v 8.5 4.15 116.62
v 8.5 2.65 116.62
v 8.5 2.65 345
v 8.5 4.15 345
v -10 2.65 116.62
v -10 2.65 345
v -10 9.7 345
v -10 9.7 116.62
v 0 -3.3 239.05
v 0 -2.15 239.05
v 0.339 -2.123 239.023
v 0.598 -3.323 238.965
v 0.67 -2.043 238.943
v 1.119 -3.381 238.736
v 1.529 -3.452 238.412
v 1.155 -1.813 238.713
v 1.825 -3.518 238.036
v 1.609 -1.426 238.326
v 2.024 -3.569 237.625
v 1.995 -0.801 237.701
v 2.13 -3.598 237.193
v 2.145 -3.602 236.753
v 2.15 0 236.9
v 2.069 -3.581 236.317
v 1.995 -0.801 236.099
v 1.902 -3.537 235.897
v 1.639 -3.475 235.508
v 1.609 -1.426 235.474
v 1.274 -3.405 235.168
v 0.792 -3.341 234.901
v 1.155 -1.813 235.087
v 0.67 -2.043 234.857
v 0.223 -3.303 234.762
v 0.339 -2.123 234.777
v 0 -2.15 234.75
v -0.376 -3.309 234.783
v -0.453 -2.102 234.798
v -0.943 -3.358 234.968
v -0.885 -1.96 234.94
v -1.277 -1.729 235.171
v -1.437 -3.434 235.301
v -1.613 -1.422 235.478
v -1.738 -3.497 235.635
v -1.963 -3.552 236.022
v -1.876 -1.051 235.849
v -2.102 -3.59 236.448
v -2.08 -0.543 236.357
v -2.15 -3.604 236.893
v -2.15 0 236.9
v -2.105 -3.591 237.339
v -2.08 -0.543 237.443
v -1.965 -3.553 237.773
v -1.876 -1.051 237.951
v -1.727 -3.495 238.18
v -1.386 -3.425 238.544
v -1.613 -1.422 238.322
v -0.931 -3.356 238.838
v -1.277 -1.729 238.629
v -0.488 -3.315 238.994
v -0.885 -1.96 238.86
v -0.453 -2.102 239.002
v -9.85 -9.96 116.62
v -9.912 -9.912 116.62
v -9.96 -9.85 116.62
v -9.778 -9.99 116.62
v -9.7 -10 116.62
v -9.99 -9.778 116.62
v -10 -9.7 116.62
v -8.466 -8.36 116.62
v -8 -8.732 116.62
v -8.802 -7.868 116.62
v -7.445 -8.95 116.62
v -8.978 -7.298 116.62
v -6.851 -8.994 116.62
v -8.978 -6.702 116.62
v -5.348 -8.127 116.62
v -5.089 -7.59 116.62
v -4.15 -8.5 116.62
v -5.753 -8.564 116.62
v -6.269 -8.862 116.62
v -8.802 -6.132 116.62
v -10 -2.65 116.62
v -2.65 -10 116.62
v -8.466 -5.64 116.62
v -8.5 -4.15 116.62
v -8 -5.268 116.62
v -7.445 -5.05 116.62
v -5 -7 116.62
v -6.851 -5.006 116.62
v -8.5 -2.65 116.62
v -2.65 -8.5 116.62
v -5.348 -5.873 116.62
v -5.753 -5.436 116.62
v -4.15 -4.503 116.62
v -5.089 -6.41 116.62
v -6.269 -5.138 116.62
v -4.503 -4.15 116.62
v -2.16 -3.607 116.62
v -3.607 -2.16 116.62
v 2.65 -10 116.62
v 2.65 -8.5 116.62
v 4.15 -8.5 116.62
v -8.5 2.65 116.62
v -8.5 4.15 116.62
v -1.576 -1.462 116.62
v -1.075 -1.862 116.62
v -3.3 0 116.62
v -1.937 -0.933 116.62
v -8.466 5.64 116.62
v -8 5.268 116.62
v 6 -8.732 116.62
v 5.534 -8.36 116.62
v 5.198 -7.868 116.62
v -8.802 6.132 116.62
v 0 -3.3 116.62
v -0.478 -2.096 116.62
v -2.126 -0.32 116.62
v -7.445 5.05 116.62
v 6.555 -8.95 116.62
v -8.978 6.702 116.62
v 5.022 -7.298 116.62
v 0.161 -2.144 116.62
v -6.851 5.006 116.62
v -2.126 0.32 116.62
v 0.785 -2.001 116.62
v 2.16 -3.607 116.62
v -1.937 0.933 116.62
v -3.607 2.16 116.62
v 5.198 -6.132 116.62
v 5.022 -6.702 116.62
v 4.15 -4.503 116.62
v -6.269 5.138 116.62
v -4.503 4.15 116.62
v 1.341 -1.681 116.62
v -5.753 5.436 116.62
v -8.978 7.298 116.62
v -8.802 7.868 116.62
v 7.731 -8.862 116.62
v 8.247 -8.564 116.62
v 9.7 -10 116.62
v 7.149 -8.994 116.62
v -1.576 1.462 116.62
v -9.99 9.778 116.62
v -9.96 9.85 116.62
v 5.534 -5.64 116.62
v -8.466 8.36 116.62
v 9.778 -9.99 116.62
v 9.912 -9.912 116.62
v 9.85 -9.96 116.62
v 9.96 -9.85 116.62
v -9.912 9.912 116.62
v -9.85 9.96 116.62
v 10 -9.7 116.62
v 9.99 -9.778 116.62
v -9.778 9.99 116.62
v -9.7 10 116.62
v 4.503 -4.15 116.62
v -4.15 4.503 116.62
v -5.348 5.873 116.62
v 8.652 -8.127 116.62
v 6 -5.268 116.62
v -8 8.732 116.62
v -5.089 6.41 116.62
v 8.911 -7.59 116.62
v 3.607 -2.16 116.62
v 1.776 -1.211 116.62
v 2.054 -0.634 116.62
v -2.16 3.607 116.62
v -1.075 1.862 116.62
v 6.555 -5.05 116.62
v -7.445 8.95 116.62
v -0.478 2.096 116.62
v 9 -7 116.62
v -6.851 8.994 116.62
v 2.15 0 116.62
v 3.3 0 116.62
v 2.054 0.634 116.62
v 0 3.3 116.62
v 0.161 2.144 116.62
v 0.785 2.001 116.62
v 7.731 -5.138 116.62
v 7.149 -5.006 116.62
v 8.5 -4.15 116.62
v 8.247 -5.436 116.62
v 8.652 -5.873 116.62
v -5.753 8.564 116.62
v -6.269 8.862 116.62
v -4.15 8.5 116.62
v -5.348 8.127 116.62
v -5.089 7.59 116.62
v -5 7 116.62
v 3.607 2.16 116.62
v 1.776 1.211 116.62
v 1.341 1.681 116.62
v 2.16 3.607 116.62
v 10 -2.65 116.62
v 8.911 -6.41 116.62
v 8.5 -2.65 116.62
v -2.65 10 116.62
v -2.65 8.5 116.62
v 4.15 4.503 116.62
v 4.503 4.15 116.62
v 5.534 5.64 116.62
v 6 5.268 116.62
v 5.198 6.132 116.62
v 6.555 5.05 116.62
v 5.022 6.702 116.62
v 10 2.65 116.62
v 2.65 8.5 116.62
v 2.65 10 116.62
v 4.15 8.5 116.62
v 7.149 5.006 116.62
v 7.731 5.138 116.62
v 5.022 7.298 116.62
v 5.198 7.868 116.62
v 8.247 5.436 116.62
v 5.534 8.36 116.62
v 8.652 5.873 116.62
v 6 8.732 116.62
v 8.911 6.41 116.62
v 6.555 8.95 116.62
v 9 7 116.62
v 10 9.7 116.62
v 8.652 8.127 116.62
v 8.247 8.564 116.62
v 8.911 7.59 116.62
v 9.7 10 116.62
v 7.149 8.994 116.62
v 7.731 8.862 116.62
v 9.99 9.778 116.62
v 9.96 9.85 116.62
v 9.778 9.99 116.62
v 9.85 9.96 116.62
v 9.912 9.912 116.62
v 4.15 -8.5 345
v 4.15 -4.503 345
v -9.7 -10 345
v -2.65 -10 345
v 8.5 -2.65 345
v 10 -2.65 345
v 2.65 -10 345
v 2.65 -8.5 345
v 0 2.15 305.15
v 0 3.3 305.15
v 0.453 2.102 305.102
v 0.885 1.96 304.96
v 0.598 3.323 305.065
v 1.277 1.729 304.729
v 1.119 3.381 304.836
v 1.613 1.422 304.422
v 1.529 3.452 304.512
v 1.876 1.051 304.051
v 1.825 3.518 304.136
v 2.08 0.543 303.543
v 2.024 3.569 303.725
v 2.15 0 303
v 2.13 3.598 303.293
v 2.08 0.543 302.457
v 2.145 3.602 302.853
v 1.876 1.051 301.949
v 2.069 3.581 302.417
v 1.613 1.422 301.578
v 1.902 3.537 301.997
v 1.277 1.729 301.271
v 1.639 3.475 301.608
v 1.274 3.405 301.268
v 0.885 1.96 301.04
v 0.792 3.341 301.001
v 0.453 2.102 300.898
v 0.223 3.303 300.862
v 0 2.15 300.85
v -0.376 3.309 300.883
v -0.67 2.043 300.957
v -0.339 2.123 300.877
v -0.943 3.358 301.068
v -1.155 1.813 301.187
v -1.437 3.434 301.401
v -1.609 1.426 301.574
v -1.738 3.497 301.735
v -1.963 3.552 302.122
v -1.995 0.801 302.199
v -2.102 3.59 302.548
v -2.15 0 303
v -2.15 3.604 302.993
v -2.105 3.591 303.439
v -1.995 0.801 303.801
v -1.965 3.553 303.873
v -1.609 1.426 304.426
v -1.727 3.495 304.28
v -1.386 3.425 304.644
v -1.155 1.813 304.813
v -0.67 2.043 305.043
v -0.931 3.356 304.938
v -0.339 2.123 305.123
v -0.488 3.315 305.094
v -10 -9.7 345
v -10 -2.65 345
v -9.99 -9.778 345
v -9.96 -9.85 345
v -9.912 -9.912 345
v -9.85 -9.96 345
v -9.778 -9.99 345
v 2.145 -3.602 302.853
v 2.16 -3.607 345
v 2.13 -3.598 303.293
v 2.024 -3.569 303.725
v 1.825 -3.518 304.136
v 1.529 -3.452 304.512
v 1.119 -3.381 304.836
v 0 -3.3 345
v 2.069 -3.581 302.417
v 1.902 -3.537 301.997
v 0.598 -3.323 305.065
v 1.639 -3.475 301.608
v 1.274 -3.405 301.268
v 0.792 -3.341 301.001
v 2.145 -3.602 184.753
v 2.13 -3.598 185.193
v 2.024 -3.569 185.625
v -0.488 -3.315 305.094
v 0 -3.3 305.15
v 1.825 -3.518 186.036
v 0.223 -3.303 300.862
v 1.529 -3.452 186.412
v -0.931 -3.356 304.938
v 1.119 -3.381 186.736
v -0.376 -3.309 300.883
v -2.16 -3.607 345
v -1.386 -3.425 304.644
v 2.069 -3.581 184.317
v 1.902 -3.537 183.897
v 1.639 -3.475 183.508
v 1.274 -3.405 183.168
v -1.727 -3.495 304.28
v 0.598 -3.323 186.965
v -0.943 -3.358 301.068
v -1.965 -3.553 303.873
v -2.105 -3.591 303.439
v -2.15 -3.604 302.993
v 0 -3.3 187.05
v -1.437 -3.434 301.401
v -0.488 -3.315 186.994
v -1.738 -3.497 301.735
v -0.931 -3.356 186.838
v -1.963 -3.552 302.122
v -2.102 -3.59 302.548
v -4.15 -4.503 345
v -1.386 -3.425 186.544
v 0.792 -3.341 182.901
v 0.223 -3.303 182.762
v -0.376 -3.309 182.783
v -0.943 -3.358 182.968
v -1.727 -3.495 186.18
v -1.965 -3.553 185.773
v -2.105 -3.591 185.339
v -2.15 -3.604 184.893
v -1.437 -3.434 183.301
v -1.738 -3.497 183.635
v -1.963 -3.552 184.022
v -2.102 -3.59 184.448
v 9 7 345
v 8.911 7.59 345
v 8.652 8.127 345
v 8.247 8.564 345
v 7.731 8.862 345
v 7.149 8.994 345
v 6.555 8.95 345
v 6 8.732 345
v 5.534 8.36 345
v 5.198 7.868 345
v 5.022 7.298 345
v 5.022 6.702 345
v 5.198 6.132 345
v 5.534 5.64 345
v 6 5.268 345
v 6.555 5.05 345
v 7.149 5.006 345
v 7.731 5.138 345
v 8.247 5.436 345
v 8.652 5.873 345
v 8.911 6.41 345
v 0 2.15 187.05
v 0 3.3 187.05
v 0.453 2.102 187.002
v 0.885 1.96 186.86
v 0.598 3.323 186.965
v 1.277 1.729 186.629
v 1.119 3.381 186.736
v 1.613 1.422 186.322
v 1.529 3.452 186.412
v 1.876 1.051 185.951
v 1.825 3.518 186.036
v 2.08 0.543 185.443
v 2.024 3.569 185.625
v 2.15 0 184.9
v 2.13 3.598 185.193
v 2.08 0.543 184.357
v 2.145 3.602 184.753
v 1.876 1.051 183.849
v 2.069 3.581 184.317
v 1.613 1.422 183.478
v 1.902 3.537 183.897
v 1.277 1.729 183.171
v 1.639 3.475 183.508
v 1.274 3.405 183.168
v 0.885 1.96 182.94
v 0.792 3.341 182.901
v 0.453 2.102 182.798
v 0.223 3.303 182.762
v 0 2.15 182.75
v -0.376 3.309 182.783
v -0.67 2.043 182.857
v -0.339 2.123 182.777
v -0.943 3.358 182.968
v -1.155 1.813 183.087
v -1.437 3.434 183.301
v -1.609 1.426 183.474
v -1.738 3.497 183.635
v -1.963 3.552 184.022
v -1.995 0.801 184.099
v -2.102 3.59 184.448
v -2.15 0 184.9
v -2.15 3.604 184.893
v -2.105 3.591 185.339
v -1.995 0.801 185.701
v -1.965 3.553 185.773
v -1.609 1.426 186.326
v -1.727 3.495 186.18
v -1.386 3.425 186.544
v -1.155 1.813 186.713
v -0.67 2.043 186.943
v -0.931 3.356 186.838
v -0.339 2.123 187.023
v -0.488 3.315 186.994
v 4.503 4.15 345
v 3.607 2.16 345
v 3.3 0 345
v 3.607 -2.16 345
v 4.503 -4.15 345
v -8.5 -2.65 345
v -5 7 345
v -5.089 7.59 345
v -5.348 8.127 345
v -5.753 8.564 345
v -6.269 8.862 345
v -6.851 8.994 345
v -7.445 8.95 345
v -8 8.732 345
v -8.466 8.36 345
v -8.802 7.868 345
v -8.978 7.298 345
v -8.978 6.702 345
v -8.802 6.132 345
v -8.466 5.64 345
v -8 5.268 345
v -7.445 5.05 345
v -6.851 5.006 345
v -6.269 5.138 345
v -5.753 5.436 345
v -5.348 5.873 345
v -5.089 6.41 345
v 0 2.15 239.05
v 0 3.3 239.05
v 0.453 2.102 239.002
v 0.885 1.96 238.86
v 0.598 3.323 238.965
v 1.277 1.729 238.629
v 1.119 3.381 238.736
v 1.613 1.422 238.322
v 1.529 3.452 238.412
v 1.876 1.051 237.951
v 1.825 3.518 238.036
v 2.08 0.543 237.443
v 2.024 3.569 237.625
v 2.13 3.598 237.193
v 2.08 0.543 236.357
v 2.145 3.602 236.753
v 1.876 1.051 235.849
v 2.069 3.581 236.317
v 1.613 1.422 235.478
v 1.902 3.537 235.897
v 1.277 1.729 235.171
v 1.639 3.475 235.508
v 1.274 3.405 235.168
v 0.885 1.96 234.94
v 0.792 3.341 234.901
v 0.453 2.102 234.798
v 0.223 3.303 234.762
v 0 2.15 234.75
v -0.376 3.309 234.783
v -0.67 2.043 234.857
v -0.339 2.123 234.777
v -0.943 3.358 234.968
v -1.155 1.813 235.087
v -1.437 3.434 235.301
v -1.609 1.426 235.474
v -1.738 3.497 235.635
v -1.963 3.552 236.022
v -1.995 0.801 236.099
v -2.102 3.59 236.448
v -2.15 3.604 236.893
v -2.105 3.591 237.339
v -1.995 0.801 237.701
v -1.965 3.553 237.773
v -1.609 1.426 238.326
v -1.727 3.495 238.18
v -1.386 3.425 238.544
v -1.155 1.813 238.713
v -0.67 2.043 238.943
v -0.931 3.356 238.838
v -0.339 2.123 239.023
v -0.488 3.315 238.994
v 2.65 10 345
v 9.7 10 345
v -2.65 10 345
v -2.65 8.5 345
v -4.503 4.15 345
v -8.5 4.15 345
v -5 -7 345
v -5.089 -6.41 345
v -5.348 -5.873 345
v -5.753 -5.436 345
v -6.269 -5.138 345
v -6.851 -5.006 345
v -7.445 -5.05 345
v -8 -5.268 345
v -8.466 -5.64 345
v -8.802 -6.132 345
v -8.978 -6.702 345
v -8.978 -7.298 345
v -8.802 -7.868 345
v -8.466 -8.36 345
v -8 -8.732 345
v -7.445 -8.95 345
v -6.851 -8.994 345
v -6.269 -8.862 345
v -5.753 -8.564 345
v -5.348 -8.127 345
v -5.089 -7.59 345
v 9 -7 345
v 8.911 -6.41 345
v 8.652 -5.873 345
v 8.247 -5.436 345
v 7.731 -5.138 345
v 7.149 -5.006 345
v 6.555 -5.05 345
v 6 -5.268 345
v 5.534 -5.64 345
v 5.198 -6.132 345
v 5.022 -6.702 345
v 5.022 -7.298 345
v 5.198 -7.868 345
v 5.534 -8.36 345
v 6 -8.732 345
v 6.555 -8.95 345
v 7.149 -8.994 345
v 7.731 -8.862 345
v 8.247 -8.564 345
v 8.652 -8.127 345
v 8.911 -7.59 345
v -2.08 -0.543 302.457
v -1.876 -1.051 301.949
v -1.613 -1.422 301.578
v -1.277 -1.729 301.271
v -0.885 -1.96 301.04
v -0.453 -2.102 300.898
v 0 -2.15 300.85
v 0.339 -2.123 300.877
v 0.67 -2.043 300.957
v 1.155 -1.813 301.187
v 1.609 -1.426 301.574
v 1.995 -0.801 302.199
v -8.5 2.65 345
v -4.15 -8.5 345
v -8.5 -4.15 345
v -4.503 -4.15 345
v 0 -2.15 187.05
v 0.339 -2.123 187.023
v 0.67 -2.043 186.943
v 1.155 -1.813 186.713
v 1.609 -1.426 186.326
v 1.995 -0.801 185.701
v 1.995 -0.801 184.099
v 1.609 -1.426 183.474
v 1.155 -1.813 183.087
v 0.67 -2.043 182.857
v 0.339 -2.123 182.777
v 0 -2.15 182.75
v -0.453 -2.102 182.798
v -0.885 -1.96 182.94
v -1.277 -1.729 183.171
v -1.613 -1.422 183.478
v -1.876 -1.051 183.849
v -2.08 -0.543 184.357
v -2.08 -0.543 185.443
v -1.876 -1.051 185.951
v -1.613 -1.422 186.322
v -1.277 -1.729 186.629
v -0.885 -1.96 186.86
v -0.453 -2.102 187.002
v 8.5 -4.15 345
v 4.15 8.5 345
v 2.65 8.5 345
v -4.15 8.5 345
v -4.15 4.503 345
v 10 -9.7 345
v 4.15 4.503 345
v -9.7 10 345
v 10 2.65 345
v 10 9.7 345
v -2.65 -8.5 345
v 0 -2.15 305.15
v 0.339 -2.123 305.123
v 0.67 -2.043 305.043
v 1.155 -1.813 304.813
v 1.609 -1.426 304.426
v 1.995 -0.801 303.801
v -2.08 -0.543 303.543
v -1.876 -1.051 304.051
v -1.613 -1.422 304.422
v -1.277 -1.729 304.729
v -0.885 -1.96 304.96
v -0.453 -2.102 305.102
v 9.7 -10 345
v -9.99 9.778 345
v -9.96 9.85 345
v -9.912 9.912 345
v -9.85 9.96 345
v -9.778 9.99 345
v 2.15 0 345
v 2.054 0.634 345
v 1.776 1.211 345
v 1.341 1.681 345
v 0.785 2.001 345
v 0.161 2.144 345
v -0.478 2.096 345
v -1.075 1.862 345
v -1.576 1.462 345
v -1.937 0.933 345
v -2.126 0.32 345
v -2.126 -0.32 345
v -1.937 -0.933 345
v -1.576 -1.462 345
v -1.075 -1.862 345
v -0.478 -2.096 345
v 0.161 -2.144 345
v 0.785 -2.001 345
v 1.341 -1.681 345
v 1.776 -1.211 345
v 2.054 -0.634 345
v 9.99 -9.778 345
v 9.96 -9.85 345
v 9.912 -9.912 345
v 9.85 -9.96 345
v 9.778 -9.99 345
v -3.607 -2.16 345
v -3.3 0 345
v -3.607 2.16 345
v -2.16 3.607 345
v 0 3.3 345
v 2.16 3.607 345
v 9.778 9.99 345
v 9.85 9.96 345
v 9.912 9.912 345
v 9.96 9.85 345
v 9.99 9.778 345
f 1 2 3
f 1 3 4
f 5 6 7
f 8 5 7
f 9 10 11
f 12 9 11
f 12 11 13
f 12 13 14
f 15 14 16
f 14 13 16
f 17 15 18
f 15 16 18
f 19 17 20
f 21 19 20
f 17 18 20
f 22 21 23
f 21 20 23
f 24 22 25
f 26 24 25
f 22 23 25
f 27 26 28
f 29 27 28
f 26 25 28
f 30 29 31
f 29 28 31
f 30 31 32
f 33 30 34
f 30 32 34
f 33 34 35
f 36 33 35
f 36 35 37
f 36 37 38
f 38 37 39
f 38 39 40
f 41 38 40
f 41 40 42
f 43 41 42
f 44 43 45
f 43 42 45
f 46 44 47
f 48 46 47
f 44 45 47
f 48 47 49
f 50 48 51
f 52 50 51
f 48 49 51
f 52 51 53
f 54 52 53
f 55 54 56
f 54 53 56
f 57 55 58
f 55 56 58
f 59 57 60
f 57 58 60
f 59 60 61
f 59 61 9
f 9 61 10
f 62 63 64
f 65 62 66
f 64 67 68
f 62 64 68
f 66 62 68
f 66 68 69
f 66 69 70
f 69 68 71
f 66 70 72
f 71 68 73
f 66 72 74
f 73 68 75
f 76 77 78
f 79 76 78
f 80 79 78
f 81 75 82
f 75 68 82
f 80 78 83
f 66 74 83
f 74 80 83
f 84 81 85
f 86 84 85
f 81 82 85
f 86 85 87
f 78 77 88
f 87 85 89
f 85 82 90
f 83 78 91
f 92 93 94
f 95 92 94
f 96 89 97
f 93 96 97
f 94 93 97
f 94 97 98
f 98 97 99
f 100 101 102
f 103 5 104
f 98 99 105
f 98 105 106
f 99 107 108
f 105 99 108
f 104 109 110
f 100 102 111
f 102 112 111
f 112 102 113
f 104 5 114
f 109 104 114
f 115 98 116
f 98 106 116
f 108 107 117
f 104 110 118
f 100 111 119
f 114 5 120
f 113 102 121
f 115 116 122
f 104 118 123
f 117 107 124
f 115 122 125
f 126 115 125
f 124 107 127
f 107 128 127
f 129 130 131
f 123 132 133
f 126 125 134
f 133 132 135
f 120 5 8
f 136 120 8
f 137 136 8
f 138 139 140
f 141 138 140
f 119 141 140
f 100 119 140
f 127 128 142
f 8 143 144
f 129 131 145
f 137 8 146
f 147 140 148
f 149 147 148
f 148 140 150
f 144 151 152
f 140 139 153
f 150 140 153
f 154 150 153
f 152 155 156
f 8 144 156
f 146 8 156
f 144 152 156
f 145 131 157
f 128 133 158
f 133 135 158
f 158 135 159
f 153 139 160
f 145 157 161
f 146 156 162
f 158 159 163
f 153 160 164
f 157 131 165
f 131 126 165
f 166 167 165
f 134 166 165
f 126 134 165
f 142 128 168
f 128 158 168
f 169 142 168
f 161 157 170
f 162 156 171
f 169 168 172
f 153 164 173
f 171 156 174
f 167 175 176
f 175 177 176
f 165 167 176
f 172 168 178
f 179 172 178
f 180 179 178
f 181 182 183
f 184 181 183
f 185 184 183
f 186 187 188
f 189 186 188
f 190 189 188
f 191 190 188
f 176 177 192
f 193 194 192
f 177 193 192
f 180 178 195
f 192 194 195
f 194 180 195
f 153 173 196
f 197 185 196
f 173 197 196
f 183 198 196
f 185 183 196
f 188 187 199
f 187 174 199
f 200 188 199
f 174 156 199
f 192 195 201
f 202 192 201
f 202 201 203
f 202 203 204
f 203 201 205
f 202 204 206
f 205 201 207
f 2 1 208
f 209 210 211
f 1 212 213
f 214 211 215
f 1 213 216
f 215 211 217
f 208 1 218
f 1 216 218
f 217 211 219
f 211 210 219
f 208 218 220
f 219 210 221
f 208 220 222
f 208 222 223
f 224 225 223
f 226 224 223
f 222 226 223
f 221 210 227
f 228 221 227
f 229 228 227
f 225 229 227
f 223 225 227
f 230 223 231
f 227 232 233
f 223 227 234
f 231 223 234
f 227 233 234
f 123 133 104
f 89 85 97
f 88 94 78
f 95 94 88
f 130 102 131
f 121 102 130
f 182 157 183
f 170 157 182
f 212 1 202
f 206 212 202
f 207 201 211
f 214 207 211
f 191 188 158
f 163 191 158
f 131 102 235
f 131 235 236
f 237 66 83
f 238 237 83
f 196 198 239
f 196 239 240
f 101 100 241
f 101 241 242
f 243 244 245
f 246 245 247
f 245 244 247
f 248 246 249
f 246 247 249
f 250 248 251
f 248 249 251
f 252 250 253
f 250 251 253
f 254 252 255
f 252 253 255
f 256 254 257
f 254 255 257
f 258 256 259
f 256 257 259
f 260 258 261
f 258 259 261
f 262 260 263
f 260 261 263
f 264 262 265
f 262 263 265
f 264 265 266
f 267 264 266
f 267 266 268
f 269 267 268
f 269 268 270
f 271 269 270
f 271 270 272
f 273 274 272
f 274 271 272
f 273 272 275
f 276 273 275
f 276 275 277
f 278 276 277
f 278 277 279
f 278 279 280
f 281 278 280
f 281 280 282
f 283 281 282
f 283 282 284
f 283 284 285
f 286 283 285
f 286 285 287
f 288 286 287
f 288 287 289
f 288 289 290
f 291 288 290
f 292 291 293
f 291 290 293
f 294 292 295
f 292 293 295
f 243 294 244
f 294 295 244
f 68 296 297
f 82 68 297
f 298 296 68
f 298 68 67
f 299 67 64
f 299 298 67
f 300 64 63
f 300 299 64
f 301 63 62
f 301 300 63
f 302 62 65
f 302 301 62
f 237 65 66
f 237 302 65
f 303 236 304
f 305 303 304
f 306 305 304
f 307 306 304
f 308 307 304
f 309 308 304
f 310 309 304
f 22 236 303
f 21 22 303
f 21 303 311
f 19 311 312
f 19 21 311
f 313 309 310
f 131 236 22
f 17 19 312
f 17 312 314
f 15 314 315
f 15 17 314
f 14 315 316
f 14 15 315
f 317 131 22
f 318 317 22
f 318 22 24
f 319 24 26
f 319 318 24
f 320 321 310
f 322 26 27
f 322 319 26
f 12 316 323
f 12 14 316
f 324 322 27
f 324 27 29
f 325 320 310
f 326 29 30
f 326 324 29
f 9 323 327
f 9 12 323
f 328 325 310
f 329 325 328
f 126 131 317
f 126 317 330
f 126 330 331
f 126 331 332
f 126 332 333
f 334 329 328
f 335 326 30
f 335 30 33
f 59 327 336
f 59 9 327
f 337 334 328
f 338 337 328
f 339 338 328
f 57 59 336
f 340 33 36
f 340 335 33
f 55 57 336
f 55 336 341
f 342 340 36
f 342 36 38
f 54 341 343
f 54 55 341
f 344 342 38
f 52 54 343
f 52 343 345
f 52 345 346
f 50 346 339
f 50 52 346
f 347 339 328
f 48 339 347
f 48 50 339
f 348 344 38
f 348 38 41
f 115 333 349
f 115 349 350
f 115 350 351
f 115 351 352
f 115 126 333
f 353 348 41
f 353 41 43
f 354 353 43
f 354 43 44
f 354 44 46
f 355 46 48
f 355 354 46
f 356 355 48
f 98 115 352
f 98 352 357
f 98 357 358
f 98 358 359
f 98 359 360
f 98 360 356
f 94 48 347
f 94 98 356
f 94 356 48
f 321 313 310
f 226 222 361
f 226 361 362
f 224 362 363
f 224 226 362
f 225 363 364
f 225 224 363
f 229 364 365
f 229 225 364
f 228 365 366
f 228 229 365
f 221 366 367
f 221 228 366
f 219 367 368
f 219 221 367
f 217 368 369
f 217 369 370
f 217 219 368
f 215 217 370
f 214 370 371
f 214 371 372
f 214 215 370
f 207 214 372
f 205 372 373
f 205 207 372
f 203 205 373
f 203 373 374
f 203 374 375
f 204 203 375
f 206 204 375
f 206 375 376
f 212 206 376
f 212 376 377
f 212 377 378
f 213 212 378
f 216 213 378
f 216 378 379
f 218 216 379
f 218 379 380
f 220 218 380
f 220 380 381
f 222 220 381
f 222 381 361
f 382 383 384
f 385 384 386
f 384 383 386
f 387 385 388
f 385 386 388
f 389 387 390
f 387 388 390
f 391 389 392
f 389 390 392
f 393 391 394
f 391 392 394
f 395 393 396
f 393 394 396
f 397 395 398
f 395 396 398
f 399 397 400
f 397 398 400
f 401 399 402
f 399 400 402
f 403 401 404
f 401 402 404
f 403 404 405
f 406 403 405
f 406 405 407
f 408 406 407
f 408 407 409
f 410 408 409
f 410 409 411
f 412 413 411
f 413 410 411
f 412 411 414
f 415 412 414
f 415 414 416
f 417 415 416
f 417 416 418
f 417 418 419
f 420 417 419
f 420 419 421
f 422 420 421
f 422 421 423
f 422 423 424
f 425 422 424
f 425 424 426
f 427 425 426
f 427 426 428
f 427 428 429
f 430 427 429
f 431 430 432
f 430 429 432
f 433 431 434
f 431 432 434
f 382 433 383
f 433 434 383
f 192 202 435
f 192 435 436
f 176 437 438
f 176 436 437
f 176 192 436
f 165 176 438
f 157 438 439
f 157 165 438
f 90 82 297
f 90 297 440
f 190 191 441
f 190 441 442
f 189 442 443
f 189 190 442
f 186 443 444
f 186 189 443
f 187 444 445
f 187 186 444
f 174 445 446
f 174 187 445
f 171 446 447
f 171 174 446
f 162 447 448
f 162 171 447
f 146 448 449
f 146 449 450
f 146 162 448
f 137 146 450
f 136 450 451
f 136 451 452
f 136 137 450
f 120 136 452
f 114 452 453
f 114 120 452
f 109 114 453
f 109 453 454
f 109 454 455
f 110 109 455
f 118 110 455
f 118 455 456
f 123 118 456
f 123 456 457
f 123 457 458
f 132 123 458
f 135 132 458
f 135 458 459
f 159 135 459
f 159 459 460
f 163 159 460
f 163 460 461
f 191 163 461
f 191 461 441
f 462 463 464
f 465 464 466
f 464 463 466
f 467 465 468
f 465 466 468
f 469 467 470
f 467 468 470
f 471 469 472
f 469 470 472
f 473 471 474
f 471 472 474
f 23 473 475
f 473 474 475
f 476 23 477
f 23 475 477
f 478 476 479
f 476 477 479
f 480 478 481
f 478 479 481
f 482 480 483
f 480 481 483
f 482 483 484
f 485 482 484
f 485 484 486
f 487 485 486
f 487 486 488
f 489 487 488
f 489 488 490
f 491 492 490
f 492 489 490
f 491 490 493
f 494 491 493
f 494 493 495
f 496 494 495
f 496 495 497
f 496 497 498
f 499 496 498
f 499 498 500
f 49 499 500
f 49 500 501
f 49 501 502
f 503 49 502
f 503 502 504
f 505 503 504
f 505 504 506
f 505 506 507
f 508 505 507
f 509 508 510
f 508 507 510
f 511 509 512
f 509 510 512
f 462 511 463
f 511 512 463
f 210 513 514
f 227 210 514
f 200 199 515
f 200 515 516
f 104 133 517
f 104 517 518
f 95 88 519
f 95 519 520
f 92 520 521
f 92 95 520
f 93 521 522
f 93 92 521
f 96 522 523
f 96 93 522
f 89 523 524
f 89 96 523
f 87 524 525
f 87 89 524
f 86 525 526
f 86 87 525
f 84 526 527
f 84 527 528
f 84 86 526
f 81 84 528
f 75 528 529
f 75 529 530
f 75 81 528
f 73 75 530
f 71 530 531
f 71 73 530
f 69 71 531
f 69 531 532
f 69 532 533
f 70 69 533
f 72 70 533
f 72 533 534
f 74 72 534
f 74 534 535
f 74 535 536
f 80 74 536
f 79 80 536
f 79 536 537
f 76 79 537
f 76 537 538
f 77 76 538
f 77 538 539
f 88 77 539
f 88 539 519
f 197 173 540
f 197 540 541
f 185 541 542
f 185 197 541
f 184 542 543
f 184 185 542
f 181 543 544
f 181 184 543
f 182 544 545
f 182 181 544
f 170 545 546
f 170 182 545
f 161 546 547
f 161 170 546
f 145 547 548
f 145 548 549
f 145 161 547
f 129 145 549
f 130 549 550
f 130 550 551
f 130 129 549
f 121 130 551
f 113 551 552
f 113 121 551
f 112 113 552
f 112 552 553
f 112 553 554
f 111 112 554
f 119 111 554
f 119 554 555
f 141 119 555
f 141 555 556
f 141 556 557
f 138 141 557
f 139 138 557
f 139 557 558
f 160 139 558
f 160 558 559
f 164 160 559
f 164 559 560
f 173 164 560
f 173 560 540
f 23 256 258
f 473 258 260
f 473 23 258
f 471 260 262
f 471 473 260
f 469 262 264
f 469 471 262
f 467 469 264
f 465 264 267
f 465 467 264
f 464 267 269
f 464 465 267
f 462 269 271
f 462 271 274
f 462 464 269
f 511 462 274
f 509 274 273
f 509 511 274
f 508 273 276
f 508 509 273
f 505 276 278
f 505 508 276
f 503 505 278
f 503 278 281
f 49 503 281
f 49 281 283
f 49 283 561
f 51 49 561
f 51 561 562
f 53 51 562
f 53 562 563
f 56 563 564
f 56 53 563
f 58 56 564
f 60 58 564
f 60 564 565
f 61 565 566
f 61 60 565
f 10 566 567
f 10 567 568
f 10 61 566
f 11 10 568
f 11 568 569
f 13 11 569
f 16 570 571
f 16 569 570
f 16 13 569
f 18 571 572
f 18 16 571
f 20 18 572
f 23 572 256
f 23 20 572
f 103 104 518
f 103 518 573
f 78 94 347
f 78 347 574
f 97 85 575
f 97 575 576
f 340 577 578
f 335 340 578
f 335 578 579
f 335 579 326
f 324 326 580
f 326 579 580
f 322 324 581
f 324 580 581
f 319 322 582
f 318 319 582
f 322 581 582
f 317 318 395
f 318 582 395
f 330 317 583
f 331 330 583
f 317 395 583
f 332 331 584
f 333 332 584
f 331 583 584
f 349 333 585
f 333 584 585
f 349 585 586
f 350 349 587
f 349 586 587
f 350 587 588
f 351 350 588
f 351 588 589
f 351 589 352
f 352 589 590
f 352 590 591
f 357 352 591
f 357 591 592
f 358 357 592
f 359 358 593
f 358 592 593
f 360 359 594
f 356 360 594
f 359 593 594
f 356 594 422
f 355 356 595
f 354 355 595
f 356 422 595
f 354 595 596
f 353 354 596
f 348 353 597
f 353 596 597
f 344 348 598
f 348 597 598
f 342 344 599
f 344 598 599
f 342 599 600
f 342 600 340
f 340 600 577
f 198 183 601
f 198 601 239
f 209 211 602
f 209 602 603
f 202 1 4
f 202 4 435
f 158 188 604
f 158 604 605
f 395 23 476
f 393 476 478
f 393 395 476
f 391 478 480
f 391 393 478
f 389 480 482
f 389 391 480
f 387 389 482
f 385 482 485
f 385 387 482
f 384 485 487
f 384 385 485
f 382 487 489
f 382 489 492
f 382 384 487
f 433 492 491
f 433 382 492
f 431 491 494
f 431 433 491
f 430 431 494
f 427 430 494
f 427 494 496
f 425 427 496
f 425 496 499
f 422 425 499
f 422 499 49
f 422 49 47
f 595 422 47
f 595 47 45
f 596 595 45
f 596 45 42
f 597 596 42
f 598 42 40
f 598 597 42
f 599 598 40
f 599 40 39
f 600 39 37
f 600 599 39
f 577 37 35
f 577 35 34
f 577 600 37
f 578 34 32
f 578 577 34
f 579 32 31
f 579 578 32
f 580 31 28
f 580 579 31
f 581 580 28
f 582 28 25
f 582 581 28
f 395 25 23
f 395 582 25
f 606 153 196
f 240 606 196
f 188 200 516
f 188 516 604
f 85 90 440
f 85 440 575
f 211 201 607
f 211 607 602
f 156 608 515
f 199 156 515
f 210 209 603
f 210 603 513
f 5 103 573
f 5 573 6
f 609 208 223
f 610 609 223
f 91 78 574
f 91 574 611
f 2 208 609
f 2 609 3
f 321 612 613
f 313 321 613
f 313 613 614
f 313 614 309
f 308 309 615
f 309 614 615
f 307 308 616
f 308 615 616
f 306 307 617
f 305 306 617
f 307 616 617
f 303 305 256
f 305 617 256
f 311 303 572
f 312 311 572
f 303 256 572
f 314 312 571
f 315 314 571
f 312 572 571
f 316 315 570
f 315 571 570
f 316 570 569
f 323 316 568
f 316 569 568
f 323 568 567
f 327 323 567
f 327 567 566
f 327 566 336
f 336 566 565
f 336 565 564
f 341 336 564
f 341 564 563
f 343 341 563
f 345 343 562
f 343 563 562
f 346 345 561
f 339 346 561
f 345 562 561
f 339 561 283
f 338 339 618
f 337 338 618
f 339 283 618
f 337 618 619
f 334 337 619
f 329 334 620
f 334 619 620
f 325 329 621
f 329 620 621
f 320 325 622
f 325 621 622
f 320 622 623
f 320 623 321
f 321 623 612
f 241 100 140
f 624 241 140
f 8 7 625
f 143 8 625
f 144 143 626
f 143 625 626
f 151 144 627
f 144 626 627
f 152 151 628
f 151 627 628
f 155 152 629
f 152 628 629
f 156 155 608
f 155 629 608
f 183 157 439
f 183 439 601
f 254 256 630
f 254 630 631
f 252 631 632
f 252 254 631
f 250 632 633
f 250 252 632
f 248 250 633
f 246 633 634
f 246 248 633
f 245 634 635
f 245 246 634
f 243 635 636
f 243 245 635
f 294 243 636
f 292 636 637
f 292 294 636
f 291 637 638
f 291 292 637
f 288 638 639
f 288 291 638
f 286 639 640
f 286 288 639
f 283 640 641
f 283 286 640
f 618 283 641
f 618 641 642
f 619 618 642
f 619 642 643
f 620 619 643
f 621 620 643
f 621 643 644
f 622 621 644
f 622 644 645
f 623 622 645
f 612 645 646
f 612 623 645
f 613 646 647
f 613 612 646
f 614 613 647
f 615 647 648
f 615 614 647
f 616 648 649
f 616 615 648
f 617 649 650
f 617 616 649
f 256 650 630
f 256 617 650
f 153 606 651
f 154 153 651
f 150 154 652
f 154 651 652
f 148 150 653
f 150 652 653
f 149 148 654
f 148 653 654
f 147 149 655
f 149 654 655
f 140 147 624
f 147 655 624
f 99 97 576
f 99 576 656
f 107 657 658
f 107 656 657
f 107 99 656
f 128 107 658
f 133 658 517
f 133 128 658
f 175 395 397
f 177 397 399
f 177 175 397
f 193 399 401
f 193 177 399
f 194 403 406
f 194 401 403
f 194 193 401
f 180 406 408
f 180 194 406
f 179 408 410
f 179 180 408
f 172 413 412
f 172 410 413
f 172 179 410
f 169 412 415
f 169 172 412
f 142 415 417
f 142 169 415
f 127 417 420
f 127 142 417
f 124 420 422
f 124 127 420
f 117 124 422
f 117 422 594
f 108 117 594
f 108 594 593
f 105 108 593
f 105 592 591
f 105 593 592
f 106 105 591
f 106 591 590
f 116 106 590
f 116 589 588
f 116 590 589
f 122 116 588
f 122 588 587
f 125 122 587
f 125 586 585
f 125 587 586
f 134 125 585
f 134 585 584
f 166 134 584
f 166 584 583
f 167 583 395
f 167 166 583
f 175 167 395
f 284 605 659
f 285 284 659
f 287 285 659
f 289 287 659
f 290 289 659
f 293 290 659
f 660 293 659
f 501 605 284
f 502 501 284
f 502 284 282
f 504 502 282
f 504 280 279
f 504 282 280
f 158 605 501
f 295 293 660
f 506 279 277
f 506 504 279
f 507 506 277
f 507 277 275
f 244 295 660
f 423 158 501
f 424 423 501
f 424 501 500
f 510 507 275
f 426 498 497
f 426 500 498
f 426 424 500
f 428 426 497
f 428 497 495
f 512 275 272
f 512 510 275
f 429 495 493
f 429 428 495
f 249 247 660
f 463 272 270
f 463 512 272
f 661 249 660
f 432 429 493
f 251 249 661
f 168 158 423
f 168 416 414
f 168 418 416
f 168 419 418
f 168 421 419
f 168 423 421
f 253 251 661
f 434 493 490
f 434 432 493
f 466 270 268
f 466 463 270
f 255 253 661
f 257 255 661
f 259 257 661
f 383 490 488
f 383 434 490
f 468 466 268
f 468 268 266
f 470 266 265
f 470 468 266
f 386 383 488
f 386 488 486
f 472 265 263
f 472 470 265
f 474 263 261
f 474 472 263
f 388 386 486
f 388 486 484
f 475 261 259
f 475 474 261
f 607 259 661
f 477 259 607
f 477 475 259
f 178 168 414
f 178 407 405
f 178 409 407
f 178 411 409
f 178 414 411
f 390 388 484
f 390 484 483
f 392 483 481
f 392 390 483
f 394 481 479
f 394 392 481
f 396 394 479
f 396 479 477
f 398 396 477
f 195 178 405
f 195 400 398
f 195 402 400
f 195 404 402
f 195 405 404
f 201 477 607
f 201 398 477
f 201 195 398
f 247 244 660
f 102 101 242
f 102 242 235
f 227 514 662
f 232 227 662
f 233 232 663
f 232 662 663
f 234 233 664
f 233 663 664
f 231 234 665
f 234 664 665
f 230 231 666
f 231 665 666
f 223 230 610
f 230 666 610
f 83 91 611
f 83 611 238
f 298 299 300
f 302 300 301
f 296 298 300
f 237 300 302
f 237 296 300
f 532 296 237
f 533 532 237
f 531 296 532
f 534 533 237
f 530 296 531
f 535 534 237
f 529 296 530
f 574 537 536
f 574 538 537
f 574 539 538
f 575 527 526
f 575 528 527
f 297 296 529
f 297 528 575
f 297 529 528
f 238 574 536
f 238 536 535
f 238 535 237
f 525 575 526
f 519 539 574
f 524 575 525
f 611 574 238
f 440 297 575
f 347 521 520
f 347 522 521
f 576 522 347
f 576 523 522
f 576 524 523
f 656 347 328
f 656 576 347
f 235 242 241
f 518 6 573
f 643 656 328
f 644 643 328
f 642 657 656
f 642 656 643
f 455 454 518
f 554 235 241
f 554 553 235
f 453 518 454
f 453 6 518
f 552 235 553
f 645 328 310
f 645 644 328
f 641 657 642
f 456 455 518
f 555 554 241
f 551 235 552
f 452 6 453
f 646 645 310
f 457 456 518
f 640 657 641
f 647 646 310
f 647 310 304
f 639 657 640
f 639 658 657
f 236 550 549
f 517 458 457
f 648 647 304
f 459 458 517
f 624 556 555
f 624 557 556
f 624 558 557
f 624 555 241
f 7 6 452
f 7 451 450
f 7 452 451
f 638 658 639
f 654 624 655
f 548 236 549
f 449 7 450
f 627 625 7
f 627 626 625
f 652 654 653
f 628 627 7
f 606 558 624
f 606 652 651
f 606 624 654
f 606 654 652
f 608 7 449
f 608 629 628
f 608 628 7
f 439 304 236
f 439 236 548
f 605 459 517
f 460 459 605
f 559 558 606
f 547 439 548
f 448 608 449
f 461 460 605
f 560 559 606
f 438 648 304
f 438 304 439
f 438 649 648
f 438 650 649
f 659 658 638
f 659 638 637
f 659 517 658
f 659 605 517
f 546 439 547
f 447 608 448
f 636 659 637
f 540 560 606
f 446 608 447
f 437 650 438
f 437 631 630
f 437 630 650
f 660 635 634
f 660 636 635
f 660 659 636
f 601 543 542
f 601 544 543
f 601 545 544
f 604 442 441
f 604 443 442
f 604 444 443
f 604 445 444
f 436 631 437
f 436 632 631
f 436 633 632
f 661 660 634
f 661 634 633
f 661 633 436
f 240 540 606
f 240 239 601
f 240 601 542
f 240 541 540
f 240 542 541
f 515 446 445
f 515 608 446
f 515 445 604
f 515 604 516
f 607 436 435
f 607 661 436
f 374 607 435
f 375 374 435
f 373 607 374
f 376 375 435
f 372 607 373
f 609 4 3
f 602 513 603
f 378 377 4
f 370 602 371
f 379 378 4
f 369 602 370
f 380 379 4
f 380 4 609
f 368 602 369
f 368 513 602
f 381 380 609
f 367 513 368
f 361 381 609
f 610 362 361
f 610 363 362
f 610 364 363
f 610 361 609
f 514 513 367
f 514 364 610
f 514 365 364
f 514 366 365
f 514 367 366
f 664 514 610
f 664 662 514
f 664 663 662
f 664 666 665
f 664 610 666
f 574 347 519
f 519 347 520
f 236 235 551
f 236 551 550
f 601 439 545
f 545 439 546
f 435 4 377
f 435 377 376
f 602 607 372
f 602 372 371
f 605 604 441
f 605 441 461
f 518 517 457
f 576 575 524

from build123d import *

# Parameters (mm, degrees)
SKETCH_1_W               = 20
SKETCH_1_H               = 20
SKETCH_1_R               = 2
SKETCH_1_R_2             = 2.15
EXTRUDE_1_DEPTH          = 345
CUT_EXTRUDE_1_REACH      = 347.29
PATTERN_CIRCULAR_1_COUNT = 4
FILLET_1_R               = 0.3
CUT_EXTRUDE_2_DEPTH      = 346.289733412
CUT_EXTRUDE_2_DEPTH_BACK = 346.289733412
SKETCH_2_R               = 2.5
SKETCH_4_R               = 2.15
CUT_EXTRUDE_3_DEPTH      = 346.723878361
SKETCH_6_R               = 2.15
SKETCH_6_R_2             = 1.97965
CUT_EXTRUDE_4_DEPTH      = 346.723878361
SKETCH_7_W               = 20
SKETCH_7_H               = 116.62
CUT_EXTRUDE_5_DEPTH      = 346.723878361


with BuildPart() as part:
    # 스케치1 → 보스-돌출1 (new body)
    with BuildSketch(Plane.XY):
        Rectangle(SKETCH_1_W, SKETCH_1_H)
        with Locations((-7, -7)):
            Circle(SKETCH_1_R, mode=Mode.SUBTRACT)
        with Locations((7, -7)):
            Circle(SKETCH_1_R, mode=Mode.SUBTRACT)
        with Locations((-7, 7)):
            Circle(SKETCH_1_R, mode=Mode.SUBTRACT)
        Circle(SKETCH_1_R_2, mode=Mode.SUBTRACT)
        with Locations((7, 7)):
            Circle(SKETCH_1_R, mode=Mode.SUBTRACT)
    extrude(amount=EXTRUDE_1_DEPTH)

    # 스케치1<3> → 컷-돌출1 (cut, up to next)
    with BuildSketch(Plane.XY, mode=Mode.PRIVATE) as cut_extrude_1_sk1:
        with BuildLine():
            Line((-8.5, 2.65), (-10, 2.65))
            Line((-10, 2.65), (-10, -2.65))
            Line((-10, -2.65), (-8.5, -2.65))
            Line((-8.5, -2.65), (-8.5, -4.15))
            Line((-8.5, -4.15), (-4.503166667, -4.15))
            ThreePointArc((-4.503166667, -4.15), (-3.3, 0), (-4.503166667, 4.15))
            Line((-4.503166667, 4.15), (-8.5, 4.15))
            Line((-8.5, 4.15), (-8.5, 2.65))
        make_face()
    cut_extrude_1_tool1 = extrude(cut_extrude_1_sk1.sketch, amount=CUT_EXTRUDE_1_REACH, mode=Mode.PRIVATE) & part.part
    cut_extrude_1 = cut_extrude_1_tool1.solids().sort_by_distance((-6.606913, 0, 0))[0]
    add(cut_extrude_1, mode=Mode.SUBTRACT)

    # 원형 패턴1: 컷-돌출1 ×4 about axis
    pattern_circular_1_axis = Axis((0, 0, 345), (0, 0, -1))
    for i in range(1, PATTERN_CIRCULAR_1_COUNT):
        add(cut_extrude_1.rotate(pattern_circular_1_axis, i * 360 / PATTERN_CIRCULAR_1_COUNT), mode=Mode.SUBTRACT)

    # 필렛1
    fillet_1_edges = [part.edges().sort_by_distance(p)[0] for p in [
        (10, -10, 172.5),
        (-10, -10, 172.5),
        (-10, 10, 172.5),
        (10, 10, 172.5),
    ]]
    fillet(fillet_1_edges, radius=FILLET_1_R)

    # 스케치2 → 컷-돌출2 (cut, two sides: drawn at the far end of the back side and taken through both)
    with BuildSketch(Plane(origin=(0, 0, 0), x_dir=(0, 0, -1), z_dir=(1, 0, 0)).offset(-CUT_EXTRUDE_2_DEPTH_BACK)):
        with Locations((-25, 0)):
            Circle(SKETCH_2_R)
    extrude(amount=CUT_EXTRUDE_2_DEPTH + CUT_EXTRUDE_2_DEPTH_BACK, mode=Mode.SUBTRACT)

    # 스케치4 → 컷-돌출3 (cut, through all)
    with BuildSketch(Plane(origin=(0, 10, 0), x_dir=(1, 0, 0), z_dir=(0, 1, 0))):
        with Locations((0, -303)):
            Circle(SKETCH_4_R)
    extrude(amount=-CUT_EXTRUDE_3_DEPTH, mode=Mode.SUBTRACT)

    # 스케치6 → 컷-돌출4 (cut, through all)
    with BuildSketch(Plane(origin=(0, 10, 0), x_dir=(1, 0, 0), z_dir=(0, 1, 0))):
        with Locations((0, -236.9)):
            Circle(SKETCH_6_R)
        with Locations((0, -184.9)):
            Circle(SKETCH_6_R)
        with Locations((0, -10.15)):
            Circle(SKETCH_6_R_2)
        with Locations((0, -62.15)):
            Circle(SKETCH_6_R)
    extrude(amount=-CUT_EXTRUDE_4_DEPTH, mode=Mode.SUBTRACT)

    # 스케치7 → 컷-돌출5 (cut, through all)
    with BuildSketch(Plane(origin=(0, 10, 0), x_dir=(1, 0, 0), z_dir=(0, 1, 0))):
        with Locations((0, -58.31)):
            Rectangle(SKETCH_7_W, SKETCH_7_H)
    extrude(amount=-CUT_EXTRUDE_5_DEPTH, mode=Mode.SUBTRACT)


solid = part.part
